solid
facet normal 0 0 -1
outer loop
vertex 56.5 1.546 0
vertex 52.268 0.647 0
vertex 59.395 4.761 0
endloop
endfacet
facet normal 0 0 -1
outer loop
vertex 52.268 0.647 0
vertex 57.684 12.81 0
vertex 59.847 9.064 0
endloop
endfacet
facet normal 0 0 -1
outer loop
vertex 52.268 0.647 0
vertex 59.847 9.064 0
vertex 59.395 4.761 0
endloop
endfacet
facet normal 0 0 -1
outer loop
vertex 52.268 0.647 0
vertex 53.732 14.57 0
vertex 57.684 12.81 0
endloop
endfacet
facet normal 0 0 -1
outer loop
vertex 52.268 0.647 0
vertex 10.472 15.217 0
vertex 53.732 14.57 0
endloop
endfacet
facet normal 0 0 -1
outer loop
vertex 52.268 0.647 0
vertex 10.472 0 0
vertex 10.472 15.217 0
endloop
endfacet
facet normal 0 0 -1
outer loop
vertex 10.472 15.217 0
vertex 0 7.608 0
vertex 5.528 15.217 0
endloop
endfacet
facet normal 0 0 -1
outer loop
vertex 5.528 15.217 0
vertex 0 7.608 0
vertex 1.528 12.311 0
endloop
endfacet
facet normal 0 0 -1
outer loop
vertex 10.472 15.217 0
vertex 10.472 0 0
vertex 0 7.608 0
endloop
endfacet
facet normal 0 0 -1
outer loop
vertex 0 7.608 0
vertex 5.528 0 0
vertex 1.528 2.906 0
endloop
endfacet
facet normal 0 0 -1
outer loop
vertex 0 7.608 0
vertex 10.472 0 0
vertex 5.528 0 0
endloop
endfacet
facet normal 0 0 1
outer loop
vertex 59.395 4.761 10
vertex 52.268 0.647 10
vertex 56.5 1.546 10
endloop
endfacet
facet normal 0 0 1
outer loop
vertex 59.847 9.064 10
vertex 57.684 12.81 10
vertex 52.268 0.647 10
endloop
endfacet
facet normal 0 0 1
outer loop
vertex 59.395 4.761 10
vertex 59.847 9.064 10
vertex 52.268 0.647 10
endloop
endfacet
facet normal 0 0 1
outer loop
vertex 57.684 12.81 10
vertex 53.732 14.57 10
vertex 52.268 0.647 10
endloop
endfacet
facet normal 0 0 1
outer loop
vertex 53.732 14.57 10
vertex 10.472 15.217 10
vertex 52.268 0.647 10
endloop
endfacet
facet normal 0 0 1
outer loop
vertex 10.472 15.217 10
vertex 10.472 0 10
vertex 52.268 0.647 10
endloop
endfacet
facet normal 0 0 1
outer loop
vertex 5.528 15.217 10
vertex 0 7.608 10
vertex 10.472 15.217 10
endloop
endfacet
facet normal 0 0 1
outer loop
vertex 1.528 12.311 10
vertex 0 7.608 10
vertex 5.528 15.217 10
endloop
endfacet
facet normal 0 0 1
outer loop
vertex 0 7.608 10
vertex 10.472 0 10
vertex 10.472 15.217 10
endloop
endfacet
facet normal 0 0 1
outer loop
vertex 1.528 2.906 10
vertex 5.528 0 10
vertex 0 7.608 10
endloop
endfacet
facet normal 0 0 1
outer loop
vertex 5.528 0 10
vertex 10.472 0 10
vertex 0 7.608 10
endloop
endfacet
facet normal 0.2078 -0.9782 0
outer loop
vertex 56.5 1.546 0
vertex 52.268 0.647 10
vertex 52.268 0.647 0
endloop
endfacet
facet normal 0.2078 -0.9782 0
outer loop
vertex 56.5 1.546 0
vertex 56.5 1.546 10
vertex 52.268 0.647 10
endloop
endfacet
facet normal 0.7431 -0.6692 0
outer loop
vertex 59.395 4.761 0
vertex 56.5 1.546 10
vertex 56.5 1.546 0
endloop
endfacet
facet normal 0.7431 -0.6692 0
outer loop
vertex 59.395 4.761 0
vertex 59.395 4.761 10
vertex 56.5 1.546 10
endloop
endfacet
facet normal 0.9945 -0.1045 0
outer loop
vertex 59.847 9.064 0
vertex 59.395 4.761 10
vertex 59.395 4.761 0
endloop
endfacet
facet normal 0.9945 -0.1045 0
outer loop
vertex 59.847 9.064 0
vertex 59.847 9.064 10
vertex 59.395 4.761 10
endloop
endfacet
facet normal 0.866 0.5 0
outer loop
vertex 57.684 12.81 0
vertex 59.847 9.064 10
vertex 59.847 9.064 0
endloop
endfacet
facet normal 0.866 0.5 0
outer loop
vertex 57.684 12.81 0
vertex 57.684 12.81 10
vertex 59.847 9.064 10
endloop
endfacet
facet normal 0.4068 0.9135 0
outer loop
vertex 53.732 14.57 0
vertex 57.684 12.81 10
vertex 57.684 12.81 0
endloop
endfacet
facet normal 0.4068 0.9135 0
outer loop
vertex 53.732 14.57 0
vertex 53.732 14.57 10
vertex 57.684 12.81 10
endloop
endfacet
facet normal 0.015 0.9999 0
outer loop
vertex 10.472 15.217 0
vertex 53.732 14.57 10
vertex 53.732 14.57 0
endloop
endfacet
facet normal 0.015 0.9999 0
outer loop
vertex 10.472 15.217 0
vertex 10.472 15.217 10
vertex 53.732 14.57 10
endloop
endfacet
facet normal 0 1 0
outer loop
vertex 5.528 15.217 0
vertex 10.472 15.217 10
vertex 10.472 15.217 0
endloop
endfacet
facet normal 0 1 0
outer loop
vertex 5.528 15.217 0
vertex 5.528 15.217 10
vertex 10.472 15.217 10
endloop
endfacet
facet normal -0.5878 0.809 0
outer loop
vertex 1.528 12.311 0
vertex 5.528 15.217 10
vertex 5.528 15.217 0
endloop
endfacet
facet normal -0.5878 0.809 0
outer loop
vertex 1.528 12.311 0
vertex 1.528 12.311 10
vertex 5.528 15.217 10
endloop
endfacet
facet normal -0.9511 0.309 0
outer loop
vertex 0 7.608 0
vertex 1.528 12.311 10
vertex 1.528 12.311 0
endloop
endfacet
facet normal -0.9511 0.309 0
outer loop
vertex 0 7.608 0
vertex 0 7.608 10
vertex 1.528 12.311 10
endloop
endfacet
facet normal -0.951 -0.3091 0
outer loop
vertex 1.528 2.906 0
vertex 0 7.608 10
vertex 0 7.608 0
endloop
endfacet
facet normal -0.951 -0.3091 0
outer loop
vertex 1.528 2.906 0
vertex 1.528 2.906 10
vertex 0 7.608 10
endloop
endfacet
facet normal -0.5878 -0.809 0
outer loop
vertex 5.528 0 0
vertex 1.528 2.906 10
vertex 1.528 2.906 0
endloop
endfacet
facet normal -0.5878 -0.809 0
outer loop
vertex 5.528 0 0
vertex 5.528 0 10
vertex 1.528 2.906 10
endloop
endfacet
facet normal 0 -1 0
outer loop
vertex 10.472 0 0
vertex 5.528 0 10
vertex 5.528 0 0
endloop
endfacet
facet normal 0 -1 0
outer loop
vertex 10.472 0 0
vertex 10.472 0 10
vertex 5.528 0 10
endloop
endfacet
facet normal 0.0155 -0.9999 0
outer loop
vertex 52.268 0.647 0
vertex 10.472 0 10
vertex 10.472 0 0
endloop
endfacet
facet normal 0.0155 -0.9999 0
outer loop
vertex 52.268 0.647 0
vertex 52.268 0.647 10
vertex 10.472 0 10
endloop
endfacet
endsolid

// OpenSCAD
$fn = 32;
// ----------------------------------------------------------------------
// Lever arm: two bosses 16 and 14 mm, 45 mm between centres
// ----------------------------------------------------------------------

// --- parameters (mm) ---
profile_height = 10;      // extrusion height
profile_points = 13;      // points of the closed outline

profile = [[0, 7.608], [1.528, 2.906], [5.528, 0], [10.472, 0], [52.268, 0.647], [56.5, 1.546], [59.395, 4.761], [59.847, 9.064], [57.684, 12.81], [53.732, 14.57], [10.472, 15.217], [5.528, 15.217], [1.528, 12.311]];  // single closed polygon, 13 points, counter clockwise

// --- the one profile operation ---
linear_extrude(height = profile_height) polygon(points = profile);
